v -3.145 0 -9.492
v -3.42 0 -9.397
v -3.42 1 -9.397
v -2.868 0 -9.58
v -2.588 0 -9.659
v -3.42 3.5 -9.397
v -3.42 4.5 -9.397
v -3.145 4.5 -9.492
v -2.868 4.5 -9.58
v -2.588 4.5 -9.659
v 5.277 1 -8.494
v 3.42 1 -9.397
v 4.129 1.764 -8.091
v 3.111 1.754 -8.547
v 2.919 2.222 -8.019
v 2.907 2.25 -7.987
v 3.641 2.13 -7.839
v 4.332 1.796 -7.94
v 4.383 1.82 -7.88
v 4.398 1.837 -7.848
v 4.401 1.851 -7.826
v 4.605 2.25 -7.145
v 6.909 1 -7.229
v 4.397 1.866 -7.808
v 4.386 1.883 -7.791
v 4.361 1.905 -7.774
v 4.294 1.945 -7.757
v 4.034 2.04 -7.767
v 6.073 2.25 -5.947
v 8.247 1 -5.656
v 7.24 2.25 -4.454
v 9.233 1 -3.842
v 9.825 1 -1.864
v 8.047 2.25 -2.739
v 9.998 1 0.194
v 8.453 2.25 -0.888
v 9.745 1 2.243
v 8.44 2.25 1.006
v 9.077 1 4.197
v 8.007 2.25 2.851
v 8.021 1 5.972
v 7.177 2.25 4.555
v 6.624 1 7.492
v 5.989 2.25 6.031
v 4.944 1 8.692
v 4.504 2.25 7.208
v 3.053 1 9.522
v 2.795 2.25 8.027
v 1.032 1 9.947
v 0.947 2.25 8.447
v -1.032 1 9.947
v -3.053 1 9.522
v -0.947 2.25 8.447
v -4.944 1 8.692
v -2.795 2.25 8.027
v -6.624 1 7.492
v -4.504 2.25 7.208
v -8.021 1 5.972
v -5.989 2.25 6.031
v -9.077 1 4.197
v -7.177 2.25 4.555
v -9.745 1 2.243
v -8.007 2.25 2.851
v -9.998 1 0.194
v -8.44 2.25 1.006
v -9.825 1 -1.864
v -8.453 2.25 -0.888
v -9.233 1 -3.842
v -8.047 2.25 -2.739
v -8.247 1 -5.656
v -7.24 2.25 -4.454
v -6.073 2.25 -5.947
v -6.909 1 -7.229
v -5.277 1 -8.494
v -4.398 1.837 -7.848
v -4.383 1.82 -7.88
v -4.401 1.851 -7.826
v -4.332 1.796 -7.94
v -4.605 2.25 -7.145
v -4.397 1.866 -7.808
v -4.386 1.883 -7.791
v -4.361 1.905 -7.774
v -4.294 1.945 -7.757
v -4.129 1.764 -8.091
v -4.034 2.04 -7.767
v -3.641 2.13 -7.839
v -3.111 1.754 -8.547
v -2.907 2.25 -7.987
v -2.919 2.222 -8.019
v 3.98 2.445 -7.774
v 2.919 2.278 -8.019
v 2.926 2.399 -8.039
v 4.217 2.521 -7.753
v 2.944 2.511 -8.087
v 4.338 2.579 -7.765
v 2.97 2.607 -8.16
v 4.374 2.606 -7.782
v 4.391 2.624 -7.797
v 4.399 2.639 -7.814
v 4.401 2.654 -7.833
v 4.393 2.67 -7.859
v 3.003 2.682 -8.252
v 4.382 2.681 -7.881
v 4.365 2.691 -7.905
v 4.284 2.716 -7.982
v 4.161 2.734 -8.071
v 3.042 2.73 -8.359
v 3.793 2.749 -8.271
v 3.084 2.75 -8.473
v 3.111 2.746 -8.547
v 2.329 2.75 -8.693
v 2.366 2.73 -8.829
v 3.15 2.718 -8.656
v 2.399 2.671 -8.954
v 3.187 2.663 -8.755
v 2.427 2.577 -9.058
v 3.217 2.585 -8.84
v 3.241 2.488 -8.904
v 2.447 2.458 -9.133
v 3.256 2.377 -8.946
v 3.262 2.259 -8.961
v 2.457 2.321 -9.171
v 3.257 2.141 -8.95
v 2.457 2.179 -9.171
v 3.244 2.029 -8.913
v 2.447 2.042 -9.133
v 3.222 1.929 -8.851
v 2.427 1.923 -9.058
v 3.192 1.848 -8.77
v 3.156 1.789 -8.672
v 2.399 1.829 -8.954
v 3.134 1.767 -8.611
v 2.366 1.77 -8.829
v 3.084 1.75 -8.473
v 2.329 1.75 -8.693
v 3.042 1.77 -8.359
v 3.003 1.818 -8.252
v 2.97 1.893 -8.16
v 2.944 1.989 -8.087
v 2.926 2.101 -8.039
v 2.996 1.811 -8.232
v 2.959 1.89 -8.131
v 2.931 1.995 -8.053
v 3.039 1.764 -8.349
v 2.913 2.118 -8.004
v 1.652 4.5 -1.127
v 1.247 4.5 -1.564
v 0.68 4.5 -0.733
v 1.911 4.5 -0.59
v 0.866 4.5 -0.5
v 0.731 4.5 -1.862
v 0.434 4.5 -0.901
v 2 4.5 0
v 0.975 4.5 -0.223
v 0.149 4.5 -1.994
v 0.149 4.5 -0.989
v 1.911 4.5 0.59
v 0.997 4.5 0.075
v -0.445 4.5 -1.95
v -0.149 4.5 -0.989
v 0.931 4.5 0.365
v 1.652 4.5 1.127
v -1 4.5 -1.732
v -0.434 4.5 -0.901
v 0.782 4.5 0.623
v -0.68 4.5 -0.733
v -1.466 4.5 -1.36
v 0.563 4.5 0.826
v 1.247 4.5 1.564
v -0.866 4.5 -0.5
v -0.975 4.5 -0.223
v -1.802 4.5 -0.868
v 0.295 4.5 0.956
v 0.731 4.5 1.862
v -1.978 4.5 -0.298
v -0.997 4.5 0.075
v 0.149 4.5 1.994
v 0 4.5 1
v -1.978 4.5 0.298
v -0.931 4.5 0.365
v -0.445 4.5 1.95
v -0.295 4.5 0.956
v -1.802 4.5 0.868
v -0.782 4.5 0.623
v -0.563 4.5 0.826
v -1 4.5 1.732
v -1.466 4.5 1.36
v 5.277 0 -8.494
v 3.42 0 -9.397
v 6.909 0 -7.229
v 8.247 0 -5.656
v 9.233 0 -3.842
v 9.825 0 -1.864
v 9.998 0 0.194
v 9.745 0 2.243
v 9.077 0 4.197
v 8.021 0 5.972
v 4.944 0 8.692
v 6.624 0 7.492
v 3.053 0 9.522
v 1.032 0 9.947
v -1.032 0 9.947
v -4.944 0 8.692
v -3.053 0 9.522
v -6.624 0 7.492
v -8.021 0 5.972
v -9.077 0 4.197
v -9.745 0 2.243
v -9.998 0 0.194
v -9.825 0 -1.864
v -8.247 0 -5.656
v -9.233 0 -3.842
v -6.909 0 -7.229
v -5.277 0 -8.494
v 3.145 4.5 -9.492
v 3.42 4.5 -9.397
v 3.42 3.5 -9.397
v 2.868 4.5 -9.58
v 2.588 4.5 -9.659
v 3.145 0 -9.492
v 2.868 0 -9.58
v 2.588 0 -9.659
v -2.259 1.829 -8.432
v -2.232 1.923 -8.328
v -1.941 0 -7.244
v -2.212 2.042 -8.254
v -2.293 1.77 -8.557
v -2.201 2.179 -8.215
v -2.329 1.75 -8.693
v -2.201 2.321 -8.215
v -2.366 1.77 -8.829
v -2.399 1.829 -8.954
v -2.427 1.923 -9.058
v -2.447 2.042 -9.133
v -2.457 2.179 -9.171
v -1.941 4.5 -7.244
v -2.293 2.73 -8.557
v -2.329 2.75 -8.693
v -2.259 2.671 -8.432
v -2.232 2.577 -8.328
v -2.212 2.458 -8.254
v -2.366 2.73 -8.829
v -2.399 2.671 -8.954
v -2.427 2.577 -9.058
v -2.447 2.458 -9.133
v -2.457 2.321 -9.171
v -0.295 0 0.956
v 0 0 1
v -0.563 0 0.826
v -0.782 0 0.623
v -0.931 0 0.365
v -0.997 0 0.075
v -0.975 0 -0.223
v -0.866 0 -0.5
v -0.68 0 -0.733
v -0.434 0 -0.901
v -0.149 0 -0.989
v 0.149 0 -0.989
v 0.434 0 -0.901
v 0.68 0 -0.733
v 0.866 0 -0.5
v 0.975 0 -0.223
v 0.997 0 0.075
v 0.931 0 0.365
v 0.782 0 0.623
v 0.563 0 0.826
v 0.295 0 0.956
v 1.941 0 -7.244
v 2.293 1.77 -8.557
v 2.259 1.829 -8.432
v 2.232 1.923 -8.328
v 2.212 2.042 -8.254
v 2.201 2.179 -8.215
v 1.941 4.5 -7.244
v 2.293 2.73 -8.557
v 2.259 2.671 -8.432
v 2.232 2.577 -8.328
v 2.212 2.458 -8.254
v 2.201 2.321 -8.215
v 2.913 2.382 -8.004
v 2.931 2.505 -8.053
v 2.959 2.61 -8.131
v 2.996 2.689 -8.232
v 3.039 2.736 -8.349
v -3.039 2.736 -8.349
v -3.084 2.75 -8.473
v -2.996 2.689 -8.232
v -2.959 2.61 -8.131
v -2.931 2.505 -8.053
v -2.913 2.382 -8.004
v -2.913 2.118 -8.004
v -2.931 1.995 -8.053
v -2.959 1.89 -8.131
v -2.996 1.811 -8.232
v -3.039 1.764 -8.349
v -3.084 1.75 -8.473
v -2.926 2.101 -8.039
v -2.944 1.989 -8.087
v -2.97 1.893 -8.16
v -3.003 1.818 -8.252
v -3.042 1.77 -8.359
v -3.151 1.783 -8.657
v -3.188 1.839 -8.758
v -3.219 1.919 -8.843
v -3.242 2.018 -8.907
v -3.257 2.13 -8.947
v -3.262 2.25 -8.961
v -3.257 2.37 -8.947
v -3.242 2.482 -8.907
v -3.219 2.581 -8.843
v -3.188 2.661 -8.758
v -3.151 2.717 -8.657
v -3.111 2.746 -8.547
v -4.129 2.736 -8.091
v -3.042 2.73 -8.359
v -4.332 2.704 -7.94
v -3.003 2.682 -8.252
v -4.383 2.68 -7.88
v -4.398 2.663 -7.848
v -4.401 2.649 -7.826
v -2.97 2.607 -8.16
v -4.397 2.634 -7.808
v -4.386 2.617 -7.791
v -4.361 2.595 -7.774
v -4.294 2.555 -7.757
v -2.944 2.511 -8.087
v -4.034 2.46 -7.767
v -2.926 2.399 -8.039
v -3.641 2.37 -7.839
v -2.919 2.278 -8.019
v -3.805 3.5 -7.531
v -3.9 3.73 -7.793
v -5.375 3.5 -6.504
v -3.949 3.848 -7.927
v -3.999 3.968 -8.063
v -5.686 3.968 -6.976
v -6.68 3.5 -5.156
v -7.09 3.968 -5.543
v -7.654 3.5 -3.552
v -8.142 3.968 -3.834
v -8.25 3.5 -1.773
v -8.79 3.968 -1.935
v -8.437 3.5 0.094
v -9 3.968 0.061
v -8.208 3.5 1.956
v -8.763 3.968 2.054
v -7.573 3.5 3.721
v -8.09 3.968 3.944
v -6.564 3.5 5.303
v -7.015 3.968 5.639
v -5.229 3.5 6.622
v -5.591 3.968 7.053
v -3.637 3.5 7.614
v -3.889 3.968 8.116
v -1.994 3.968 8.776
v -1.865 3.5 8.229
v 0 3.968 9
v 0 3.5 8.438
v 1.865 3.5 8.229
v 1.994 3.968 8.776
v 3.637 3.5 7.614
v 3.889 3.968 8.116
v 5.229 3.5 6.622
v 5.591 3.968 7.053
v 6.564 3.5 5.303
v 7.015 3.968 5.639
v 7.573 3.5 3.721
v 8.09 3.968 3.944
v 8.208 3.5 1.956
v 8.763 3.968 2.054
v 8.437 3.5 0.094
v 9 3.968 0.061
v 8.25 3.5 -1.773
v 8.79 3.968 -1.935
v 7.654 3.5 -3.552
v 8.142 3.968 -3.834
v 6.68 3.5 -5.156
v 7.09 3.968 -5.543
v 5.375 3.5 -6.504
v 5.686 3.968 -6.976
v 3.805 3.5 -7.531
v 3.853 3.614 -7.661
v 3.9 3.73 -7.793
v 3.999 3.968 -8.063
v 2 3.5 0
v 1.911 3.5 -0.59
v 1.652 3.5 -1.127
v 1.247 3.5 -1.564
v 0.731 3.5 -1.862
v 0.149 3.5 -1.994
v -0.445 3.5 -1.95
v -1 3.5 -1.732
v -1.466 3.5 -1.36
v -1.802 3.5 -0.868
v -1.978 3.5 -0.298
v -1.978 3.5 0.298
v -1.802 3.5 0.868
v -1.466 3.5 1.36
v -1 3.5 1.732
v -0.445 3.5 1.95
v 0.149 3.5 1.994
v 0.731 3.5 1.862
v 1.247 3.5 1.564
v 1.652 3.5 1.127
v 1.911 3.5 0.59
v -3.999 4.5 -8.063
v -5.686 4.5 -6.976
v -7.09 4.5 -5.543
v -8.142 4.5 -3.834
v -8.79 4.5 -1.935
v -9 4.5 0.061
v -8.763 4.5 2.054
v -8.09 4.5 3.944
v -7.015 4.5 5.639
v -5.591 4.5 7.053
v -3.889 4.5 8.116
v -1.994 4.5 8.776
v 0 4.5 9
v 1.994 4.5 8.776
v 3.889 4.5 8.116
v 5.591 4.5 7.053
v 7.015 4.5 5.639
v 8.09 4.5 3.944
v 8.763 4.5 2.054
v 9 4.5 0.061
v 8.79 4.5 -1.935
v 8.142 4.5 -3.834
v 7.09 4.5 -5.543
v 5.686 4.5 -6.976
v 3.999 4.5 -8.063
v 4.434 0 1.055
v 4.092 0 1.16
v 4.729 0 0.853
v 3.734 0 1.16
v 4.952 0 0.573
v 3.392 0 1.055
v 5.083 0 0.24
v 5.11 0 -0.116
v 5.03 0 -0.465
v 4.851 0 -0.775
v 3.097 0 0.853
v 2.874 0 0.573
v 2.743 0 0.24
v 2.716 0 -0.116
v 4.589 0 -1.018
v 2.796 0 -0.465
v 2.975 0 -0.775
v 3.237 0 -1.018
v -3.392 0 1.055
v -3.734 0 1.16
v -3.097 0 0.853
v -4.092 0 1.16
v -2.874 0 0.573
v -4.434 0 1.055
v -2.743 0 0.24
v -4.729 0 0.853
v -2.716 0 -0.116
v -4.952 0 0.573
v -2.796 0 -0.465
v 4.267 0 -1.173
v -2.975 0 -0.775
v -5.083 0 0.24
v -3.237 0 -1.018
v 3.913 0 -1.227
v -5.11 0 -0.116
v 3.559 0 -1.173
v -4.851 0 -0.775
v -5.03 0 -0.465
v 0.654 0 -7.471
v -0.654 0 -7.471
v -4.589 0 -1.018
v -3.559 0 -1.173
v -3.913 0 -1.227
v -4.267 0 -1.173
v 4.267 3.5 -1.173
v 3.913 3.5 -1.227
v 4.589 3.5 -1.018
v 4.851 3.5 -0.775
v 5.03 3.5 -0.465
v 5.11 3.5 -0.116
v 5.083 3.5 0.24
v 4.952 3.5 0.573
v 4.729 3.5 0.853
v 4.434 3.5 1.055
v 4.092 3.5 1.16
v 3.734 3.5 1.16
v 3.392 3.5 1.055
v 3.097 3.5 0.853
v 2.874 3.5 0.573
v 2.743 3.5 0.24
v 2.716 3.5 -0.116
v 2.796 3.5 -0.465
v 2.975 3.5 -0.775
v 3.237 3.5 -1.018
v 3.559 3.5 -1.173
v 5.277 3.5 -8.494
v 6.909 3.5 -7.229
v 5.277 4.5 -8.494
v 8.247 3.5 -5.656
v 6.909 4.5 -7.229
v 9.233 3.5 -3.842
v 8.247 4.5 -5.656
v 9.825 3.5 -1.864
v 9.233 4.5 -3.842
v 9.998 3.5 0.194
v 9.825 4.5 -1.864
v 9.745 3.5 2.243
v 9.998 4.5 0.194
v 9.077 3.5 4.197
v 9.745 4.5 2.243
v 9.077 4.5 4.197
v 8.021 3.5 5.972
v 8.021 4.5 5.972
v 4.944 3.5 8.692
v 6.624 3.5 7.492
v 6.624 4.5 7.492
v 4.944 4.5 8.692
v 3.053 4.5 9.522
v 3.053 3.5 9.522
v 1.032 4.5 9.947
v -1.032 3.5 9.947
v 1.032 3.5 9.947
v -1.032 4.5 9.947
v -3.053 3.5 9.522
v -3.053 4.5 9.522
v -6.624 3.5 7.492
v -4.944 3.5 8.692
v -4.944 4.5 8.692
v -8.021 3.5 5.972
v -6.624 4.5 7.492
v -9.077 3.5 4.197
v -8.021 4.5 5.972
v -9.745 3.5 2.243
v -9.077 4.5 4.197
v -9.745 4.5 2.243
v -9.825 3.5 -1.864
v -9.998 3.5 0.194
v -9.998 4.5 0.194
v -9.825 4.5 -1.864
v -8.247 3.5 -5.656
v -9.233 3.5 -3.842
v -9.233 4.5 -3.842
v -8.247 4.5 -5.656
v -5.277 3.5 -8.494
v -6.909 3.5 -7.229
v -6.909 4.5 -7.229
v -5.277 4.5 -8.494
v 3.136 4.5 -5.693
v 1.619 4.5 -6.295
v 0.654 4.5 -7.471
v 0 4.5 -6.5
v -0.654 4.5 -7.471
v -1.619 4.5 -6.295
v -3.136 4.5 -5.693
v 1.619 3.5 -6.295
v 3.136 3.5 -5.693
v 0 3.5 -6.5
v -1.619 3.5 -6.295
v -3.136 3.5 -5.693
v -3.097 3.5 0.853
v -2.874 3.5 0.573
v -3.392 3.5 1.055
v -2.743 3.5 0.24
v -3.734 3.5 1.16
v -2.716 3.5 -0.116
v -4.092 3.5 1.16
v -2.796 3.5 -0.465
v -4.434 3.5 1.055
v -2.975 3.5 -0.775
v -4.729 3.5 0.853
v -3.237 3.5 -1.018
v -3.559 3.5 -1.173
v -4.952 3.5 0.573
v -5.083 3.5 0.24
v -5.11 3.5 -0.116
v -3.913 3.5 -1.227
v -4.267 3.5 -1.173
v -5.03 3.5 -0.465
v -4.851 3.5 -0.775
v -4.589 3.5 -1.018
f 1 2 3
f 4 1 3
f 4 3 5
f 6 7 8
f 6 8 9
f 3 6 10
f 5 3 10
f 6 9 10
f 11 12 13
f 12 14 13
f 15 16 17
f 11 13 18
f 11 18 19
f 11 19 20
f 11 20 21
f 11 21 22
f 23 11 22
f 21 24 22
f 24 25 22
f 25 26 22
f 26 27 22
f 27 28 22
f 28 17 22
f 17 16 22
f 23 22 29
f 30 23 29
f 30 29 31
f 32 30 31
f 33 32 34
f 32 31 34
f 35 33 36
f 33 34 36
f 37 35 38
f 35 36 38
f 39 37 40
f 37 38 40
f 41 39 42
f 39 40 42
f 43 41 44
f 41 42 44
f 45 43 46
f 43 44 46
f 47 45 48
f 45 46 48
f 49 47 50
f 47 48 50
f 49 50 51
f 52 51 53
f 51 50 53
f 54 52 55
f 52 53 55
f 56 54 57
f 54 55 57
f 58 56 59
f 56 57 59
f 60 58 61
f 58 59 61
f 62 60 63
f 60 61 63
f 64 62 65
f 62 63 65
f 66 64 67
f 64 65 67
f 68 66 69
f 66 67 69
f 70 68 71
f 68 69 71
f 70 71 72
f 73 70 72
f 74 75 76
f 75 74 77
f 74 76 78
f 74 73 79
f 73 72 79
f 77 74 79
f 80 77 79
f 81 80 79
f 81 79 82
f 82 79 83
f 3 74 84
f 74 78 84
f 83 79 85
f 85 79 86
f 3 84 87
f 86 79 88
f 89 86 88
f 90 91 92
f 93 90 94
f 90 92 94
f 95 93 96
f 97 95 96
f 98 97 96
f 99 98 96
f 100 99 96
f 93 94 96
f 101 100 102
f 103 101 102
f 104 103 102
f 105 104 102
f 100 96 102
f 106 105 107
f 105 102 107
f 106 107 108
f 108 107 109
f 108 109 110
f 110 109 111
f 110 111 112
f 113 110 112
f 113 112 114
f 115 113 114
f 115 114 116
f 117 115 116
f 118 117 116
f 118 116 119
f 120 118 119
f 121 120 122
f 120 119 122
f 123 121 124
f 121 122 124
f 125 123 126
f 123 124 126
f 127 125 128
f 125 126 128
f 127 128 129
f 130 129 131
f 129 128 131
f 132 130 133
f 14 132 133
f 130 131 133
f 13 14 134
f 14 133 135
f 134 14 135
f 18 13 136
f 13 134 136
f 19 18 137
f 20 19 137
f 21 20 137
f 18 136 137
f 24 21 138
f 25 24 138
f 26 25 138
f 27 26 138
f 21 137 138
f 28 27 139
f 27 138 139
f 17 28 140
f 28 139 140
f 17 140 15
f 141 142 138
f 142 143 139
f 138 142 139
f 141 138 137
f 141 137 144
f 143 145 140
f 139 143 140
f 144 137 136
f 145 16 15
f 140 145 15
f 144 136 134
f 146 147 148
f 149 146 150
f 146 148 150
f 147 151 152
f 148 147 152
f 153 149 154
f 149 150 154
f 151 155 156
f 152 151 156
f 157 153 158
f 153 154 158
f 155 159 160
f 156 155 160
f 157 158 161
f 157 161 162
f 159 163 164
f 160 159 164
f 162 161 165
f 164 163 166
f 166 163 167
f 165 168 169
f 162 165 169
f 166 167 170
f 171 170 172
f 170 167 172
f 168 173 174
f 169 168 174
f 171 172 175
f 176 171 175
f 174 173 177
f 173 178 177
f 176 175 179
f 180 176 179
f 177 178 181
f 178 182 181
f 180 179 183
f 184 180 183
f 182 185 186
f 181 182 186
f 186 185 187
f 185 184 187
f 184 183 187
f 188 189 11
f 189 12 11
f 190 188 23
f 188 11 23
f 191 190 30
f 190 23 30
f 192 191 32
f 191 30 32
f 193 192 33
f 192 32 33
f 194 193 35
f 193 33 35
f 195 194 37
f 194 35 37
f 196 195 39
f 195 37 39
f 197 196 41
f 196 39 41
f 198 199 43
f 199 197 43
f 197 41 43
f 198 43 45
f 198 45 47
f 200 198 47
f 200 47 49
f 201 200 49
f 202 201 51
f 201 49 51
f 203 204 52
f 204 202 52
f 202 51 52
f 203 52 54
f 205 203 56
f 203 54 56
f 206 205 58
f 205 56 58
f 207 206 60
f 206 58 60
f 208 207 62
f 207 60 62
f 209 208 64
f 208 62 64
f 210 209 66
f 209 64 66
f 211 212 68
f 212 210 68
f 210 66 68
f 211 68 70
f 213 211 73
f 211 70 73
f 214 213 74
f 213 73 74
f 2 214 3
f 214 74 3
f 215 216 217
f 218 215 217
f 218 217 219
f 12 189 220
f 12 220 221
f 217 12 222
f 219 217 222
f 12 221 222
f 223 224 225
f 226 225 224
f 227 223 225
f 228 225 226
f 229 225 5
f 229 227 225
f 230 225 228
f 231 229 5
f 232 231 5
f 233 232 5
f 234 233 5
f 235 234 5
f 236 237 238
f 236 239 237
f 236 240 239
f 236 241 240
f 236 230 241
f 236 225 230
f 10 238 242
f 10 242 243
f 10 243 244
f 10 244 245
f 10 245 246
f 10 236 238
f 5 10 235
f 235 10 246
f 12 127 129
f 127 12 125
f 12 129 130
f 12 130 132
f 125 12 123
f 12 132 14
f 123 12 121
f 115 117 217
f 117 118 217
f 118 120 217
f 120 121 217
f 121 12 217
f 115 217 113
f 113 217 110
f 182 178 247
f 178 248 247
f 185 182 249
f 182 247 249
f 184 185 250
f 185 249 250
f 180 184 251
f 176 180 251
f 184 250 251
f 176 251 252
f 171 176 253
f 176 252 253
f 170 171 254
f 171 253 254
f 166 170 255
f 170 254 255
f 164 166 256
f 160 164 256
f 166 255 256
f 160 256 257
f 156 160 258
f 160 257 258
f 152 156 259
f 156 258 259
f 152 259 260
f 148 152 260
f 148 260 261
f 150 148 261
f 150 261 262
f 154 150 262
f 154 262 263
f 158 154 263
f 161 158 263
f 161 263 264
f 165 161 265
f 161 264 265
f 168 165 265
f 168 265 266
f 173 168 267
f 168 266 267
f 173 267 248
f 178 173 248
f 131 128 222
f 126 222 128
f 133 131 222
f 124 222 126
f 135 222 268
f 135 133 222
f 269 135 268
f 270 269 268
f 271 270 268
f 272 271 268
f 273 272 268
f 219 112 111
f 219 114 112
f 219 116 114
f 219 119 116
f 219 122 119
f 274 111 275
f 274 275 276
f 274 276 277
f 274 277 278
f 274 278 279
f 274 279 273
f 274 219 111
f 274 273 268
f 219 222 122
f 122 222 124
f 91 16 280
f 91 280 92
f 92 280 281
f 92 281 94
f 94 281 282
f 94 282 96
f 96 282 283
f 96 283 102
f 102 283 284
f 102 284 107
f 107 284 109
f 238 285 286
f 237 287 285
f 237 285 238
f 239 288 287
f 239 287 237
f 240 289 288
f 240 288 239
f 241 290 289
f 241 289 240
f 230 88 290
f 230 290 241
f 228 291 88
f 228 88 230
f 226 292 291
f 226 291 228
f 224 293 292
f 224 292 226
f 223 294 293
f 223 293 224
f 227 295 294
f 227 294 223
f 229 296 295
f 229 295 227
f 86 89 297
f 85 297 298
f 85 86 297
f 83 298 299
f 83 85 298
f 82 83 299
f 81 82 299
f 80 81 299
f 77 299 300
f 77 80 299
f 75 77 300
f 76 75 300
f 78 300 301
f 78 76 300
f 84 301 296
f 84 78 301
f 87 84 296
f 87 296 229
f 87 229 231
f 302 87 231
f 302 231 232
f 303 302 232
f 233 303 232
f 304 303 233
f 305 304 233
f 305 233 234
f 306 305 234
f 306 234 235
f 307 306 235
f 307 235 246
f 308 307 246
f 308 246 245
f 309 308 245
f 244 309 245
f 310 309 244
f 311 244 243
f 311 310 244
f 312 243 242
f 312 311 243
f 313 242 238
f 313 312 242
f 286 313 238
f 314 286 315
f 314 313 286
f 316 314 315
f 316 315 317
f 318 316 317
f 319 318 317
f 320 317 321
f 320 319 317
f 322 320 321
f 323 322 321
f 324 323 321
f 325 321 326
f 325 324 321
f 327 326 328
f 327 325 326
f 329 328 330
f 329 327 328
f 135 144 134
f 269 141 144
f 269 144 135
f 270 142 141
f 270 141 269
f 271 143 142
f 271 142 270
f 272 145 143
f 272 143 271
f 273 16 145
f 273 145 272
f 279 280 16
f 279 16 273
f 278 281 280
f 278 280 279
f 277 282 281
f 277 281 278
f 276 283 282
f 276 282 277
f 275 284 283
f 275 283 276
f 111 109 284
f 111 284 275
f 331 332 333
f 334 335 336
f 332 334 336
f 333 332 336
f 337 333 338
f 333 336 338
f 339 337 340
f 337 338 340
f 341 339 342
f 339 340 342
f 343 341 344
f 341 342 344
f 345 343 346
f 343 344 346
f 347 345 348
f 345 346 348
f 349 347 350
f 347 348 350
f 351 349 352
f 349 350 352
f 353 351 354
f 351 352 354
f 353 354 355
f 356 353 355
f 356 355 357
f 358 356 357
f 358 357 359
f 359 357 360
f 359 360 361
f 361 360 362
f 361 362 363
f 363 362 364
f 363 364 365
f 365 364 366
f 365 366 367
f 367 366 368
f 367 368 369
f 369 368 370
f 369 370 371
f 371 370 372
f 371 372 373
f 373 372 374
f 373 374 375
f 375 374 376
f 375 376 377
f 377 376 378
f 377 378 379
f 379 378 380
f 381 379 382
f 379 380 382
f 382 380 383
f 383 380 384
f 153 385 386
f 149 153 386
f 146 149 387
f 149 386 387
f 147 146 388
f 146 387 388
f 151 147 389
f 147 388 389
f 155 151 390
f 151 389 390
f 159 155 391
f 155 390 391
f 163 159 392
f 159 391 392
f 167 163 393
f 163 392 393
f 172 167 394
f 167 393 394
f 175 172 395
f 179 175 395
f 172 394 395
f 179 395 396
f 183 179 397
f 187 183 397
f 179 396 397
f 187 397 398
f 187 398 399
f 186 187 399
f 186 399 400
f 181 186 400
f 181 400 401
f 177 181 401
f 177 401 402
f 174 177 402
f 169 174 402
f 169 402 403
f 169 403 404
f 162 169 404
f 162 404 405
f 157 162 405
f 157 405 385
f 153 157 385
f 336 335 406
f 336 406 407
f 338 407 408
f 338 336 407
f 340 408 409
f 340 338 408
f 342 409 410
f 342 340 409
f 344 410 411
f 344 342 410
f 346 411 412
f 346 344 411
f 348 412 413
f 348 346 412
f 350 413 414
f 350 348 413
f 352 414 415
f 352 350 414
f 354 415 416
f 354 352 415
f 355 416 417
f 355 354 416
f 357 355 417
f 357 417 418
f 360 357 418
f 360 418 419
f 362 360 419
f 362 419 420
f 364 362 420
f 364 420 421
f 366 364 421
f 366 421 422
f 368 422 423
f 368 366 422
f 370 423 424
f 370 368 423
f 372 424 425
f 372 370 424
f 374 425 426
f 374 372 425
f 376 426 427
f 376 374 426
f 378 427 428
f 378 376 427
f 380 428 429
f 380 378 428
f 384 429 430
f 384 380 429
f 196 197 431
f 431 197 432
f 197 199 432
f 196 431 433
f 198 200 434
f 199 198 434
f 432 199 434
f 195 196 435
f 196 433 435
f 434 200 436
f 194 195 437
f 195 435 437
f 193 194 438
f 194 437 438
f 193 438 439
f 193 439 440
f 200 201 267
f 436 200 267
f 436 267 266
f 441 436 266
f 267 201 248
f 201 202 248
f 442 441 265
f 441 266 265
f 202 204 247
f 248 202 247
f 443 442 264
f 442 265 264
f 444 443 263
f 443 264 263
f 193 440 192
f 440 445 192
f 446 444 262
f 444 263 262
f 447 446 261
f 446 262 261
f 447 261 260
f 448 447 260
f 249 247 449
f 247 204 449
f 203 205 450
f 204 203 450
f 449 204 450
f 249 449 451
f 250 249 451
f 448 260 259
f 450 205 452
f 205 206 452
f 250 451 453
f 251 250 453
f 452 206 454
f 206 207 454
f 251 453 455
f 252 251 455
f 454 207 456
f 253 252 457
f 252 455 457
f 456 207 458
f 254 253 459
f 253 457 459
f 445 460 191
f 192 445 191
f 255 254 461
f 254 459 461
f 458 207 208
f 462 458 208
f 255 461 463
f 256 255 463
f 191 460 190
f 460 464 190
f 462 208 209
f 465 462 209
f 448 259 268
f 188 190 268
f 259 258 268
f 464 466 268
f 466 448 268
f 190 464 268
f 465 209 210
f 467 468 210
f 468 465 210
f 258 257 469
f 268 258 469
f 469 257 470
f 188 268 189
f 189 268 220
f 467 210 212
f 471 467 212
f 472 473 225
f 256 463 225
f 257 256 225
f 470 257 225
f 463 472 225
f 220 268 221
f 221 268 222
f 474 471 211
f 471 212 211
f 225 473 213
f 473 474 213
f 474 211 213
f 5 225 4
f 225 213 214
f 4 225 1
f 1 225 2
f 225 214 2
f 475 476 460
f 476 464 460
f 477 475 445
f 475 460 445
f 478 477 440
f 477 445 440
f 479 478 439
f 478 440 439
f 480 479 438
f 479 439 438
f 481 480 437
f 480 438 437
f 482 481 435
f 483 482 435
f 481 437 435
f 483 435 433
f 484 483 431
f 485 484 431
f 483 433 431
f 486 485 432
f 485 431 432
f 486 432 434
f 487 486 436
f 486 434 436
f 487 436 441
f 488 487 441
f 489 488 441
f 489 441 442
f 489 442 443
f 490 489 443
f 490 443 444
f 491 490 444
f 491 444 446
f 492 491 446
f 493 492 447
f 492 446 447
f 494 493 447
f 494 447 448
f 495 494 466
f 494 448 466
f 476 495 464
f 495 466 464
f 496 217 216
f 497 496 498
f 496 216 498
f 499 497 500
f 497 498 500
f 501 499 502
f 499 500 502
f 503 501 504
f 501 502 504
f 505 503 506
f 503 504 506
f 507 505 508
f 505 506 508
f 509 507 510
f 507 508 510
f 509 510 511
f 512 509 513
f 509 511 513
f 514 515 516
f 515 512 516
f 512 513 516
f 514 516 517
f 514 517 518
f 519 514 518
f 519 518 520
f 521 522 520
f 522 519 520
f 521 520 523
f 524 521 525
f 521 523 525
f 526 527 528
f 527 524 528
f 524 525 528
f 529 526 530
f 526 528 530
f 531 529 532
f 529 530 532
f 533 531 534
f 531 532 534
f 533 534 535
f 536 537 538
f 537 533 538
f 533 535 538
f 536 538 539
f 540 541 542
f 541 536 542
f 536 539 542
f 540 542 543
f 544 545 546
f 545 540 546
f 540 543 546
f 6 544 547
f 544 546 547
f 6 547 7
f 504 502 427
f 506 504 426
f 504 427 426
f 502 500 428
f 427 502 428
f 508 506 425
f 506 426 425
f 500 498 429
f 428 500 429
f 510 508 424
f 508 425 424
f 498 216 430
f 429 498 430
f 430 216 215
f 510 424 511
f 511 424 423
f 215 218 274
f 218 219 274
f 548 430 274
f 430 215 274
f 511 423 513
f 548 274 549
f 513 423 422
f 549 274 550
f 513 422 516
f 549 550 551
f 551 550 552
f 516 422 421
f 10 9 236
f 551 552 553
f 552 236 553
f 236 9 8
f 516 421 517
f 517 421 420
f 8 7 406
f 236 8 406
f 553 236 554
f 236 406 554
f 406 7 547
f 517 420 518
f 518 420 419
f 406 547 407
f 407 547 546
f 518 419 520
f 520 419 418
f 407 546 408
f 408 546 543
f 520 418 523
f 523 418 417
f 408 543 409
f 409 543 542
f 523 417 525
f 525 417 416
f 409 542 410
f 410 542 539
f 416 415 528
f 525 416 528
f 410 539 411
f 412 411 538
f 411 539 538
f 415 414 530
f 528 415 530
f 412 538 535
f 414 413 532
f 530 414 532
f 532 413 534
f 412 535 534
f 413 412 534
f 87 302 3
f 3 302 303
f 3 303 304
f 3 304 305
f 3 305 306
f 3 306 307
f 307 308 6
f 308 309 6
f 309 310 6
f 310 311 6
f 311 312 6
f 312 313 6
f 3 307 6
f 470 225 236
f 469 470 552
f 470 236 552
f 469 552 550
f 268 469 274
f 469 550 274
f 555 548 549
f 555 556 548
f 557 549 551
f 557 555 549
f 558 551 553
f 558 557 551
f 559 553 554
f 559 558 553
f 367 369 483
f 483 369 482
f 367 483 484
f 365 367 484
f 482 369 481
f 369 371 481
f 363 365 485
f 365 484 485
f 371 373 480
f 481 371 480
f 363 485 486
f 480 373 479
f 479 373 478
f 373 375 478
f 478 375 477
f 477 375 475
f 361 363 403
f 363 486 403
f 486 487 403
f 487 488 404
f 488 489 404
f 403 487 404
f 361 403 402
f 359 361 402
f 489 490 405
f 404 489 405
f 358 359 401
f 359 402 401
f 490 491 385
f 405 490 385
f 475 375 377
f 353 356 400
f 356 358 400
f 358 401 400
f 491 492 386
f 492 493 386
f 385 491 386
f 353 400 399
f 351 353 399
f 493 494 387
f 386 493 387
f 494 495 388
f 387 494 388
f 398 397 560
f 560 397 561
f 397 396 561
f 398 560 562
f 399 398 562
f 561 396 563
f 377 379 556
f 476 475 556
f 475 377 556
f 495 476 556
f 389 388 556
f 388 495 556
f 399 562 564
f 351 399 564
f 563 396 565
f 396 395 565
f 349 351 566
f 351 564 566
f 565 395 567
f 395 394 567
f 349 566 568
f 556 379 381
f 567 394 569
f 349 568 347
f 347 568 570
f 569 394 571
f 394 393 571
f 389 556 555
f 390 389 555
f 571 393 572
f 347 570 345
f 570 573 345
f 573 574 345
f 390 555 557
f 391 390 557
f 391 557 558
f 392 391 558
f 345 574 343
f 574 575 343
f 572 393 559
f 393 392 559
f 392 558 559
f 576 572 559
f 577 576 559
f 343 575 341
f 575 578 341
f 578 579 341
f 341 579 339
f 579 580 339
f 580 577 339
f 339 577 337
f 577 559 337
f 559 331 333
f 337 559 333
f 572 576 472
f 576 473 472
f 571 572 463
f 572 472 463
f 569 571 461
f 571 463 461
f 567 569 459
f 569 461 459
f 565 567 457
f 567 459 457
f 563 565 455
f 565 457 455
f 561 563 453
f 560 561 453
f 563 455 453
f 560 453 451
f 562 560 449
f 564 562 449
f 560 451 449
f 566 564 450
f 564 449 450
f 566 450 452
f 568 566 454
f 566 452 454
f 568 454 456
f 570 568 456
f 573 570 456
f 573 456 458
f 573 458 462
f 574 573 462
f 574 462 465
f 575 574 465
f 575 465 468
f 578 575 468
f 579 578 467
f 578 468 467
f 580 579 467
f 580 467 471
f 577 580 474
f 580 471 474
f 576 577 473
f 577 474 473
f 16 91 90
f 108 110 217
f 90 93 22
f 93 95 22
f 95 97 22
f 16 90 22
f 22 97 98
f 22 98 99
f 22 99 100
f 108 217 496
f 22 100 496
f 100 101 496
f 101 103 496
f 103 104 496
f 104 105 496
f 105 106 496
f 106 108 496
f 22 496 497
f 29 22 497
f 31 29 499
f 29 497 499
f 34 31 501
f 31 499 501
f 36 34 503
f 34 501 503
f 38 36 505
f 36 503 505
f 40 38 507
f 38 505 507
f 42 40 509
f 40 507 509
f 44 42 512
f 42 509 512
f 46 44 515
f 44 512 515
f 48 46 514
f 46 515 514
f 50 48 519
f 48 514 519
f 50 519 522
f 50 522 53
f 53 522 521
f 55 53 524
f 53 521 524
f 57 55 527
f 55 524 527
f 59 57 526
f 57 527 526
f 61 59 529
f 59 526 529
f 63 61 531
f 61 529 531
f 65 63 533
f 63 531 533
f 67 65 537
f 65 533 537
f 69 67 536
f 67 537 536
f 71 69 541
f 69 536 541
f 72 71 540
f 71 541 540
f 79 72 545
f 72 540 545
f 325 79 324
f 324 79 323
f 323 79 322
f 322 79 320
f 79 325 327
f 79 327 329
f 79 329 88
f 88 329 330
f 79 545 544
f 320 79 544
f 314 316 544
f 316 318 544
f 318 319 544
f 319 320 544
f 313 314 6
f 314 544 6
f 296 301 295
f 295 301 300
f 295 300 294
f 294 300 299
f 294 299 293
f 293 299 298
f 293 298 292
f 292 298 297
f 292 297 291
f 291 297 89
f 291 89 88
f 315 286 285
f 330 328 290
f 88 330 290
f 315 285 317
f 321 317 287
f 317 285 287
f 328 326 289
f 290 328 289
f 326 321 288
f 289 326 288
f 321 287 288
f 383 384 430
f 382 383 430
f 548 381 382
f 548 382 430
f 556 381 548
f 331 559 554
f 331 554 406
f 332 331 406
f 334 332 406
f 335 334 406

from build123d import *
from build123d.topology import SkipClean

# Parameters (mm, degrees)
CUT_EXTRUDE1_DEPTH       = 15.84082208
SHELL2_START             = 3.968374946
SHELL2_OUTLINE_R         = 2
SHELL2_DEPTH             = 0.531625054
SHELL2_START_2           = 3
SHELL2_3_DEPTH           = 0.968374946
SKETCH6_W                = 2.5
SKETCH6_H                = 4.5
SKETCH6_R                = 0.5
REVOLVE2_ANGLE           = 5
SKETCH9_R                = 0.5
REVOLVE3_ANGLE           = 5
SKETCH13_R               = 0.5
CUT_EXTRUDE3_DEPTH       = 10
CUT_EXTRUDE4_START       = -3
CUT_EXTRUDE4_OUTLINE_R   = 0.5
CUT_EXTRUDE4_DEPTH       = 3
M2_CLEARANCE_HOLE1_D     = 2.4
M2_CLEARANCE_HOLE1_DEPTH = 3.5
M2_CLEARANCE_HOLE1_TIP   = 0.721032743


with BuildPart() as part:
    # Sketch2 → Revolve1 (revolve)
    with BuildSketch(Plane.XY, mode=Mode.PRIVATE) as revolve1_sk:
        Polygon((10, 4.5), (1, 4.5), (1, 0), (10, 0), (10, 1), (8.5, 2.25), (10, 3.5), align=None)
    revolve(revolve1_sk.sketch.rotate(Axis((0, 4.5, 0), (0, -1, 0)), 90), axis=Axis((0, 4.5, 0), (0, -1, 0)))

    # Sketch3 → Cut-Extrude1 (cut, through all)
    with BuildSketch(Plane(origin=(0, 4.5, 0), x_dir=(1, 0, 0), z_dir=(0, 1, 0))):
        with BuildLine():
            Line((-3.420201433, 9.396926208), (-2.565151075, 7.047694656))
            ThreePointArc((-2.565151075, 7.047694656), (0, 7.5), (2.565151075, 7.047694656))
            Line((2.565151075, 7.047694656), (3.420201433, 9.396926208))
            ThreePointArc((3.420201433, 9.396926208), (0, 10), (-3.420201433, 9.396926208))
        make_face()
    extrude(amount=-CUT_EXTRUDE1_DEPTH, mode=Mode.SUBTRACT)

    # Shell2: read off the stored shape, not the designer's step
    # Shell2 outline → Shell2 (cut)
    with BuildSketch(Plane(origin=(0, 0, 0), x_dir=(1, 0, 0), z_dir=(0, 1, 0)).offset(SHELL2_START)):
        with BuildLine():
            Line((-3.136356765, 5.69326499), (-3.998813781, 8.062846169))
            ThreePointArc((-3.998813781, 8.062846169), (0, -9), (3.998813781, 8.062846169))
            Line((3.998813781, 8.062846169), (3.136356765, 5.69326499))
            ThreePointArc((3.136356765, 5.69326499), (0, 6.5), (-3.136356765, 5.69326499))
        make_face()
        Circle(SHELL2_OUTLINE_R, mode=Mode.SUBTRACT)
    extrude(amount=SHELL2_DEPTH, mode=Mode.SUBTRACT)

    # Shell2 2 outline → Shell2 2 (revolve, cut)
    with BuildSketch(Plane.XY):
        Polygon((2, 3.968374946), (2, 3.5), (8.437950065, 3.5), (9, 3.968374946), align=None)
    revolve(axis=Axis((0, 0, 0), (0, 1, 0)), mode=Mode.SUBTRACT)

    # Shell2 3 outline → Shell2 3 (add)
    with BuildSketch(Plane(origin=(0, 0, 0), x_dir=(1, 0, 0), z_dir=(0, 1, 0)).offset(SHELL2_START_2)):
        with BuildLine():
            Line((3.136356765, 5.69326499), (3.998813781, 8.062846169))
            ThreePointArc((3.998813781, 8.062846169), (3.54398789, 8.272856208), (3.07818129, 8.457233587))
            Line((3.07818129, 8.457233587), (2.565151075, 7.047694656))
            ThreePointArc((2.565151075, 7.047694656), (0, 7.5), (-2.565151075, 7.047694656))
            Line((-2.565151075, 7.047694656), (-3.07818129, 8.457233587))
            ThreePointArc((-3.07818129, 8.457233587), (-3.54398789, 8.272856208), (-3.998813781, 8.062846169))
            Line((-3.998813781, 8.062846169), (-3.136356765, 5.69326499))
            ThreePointArc((-3.136356765, 5.69326499), (0, 6.5), (3.136356765, 5.69326499))
        make_face()
    extrude(amount=SHELL2_3_DEPTH)

    # Sketch6 → Revolve2 (revolve)
    with BuildSketch(Plane(origin=(0, 0, 0), x_dir=(-0.3420201433256695, 0, -0.9396926207859082), z_dir=(0.9396926207859082, 0, -0.3420201433256695))):
        with Locations((8.75, 2.25)):
            Rectangle(SKETCH6_W, SKETCH6_H)
        with Locations((9, 2.25)):
            Circle(SKETCH6_R, mode=Mode.SUBTRACT)
    revolve(axis=Axis((0, 0, 0), (0, -1, 0)), revolution_arc=REVOLVE2_ANGLE)

    # Sketch9 → Revolve3 (revolve)
    with SkipClean():  # the faces are left unmerged after this step: merging them gives an invalid solid
        with BuildSketch(Plane(origin=(0, 0, 0), x_dir=(-0.3420201433256693, 0, 0.9396926207859082), z_dir=(-0.9396926207859083, 0, -0.3420201433256693))):
            Polygon((-10, 3.5), (-10, 1), (-10, 0), (-7.5, 0), (-7.5, 4.5), (-10, 4.5), align=None)
            with Locations((-9, 2.25)):
                Circle(SKETCH9_R, mode=Mode.SUBTRACT)
        revolve(axis=Axis((0, 0, 0), (0, 1, 0)), revolution_arc=REVOLVE3_ANGLE)

    # Sketch13 → Cut-Extrude3 (cut)
    with SkipClean():  # the faces are left unmerged after this step: merging them gives an invalid solid
        with BuildSketch(Plane(origin=(0, 0, 0), x_dir=(-0.25881904510252113, 0, 0.9659258262890683), z_dir=(-0.9659258262890683, 0, -0.25881904510252113))):
            with Locations((-9, 2.25)):
                Circle(SKETCH13_R)
        extrude(amount=-CUT_EXTRUDE3_DEPTH, mode=Mode.SUBTRACT)

    # Cut-Extrude4: read off the stored shape, not the designer's step
    # Cut-Extrude4 outline → Cut-Extrude4 (cut)
    with SkipClean():  # the faces are left unmerged after this step: merging them gives an invalid solid
        with BuildSketch(Plane(origin=(0, 0, 0), x_dir=(-0.25881904510252135, 0, -0.9659258262890681), z_dir=(0.9659258262890681, 0, -0.25881904510252135)).offset(CUT_EXTRUDE4_START)):
            with Locations((9, 2.25)):
                Circle(CUT_EXTRUDE4_OUTLINE_R)
        extrude(amount=CUT_EXTRUDE4_DEPTH, mode=Mode.SUBTRACT)

    # M2 Clearance Hole1
    with Locations(Plane(origin=(-3.913029006, 3.5, -0.02653295), x_dir=(0, 0, 1), z_dir=(0, 1, 0))):
        with Locations((0, 0), (0, 7.826058012)):
            Hole(M2_CLEARANCE_HOLE1_D / 2, depth=M2_CLEARANCE_HOLE1_DEPTH)
            with Locations((0, 0, -(M2_CLEARANCE_HOLE1_DEPTH + M2_CLEARANCE_HOLE1_TIP / 2))):  # 118° drill point
                Cone(0, M2_CLEARANCE_HOLE1_D / 2, M2_CLEARANCE_HOLE1_TIP, mode=Mode.SUBTRACT)


solid = part.part
